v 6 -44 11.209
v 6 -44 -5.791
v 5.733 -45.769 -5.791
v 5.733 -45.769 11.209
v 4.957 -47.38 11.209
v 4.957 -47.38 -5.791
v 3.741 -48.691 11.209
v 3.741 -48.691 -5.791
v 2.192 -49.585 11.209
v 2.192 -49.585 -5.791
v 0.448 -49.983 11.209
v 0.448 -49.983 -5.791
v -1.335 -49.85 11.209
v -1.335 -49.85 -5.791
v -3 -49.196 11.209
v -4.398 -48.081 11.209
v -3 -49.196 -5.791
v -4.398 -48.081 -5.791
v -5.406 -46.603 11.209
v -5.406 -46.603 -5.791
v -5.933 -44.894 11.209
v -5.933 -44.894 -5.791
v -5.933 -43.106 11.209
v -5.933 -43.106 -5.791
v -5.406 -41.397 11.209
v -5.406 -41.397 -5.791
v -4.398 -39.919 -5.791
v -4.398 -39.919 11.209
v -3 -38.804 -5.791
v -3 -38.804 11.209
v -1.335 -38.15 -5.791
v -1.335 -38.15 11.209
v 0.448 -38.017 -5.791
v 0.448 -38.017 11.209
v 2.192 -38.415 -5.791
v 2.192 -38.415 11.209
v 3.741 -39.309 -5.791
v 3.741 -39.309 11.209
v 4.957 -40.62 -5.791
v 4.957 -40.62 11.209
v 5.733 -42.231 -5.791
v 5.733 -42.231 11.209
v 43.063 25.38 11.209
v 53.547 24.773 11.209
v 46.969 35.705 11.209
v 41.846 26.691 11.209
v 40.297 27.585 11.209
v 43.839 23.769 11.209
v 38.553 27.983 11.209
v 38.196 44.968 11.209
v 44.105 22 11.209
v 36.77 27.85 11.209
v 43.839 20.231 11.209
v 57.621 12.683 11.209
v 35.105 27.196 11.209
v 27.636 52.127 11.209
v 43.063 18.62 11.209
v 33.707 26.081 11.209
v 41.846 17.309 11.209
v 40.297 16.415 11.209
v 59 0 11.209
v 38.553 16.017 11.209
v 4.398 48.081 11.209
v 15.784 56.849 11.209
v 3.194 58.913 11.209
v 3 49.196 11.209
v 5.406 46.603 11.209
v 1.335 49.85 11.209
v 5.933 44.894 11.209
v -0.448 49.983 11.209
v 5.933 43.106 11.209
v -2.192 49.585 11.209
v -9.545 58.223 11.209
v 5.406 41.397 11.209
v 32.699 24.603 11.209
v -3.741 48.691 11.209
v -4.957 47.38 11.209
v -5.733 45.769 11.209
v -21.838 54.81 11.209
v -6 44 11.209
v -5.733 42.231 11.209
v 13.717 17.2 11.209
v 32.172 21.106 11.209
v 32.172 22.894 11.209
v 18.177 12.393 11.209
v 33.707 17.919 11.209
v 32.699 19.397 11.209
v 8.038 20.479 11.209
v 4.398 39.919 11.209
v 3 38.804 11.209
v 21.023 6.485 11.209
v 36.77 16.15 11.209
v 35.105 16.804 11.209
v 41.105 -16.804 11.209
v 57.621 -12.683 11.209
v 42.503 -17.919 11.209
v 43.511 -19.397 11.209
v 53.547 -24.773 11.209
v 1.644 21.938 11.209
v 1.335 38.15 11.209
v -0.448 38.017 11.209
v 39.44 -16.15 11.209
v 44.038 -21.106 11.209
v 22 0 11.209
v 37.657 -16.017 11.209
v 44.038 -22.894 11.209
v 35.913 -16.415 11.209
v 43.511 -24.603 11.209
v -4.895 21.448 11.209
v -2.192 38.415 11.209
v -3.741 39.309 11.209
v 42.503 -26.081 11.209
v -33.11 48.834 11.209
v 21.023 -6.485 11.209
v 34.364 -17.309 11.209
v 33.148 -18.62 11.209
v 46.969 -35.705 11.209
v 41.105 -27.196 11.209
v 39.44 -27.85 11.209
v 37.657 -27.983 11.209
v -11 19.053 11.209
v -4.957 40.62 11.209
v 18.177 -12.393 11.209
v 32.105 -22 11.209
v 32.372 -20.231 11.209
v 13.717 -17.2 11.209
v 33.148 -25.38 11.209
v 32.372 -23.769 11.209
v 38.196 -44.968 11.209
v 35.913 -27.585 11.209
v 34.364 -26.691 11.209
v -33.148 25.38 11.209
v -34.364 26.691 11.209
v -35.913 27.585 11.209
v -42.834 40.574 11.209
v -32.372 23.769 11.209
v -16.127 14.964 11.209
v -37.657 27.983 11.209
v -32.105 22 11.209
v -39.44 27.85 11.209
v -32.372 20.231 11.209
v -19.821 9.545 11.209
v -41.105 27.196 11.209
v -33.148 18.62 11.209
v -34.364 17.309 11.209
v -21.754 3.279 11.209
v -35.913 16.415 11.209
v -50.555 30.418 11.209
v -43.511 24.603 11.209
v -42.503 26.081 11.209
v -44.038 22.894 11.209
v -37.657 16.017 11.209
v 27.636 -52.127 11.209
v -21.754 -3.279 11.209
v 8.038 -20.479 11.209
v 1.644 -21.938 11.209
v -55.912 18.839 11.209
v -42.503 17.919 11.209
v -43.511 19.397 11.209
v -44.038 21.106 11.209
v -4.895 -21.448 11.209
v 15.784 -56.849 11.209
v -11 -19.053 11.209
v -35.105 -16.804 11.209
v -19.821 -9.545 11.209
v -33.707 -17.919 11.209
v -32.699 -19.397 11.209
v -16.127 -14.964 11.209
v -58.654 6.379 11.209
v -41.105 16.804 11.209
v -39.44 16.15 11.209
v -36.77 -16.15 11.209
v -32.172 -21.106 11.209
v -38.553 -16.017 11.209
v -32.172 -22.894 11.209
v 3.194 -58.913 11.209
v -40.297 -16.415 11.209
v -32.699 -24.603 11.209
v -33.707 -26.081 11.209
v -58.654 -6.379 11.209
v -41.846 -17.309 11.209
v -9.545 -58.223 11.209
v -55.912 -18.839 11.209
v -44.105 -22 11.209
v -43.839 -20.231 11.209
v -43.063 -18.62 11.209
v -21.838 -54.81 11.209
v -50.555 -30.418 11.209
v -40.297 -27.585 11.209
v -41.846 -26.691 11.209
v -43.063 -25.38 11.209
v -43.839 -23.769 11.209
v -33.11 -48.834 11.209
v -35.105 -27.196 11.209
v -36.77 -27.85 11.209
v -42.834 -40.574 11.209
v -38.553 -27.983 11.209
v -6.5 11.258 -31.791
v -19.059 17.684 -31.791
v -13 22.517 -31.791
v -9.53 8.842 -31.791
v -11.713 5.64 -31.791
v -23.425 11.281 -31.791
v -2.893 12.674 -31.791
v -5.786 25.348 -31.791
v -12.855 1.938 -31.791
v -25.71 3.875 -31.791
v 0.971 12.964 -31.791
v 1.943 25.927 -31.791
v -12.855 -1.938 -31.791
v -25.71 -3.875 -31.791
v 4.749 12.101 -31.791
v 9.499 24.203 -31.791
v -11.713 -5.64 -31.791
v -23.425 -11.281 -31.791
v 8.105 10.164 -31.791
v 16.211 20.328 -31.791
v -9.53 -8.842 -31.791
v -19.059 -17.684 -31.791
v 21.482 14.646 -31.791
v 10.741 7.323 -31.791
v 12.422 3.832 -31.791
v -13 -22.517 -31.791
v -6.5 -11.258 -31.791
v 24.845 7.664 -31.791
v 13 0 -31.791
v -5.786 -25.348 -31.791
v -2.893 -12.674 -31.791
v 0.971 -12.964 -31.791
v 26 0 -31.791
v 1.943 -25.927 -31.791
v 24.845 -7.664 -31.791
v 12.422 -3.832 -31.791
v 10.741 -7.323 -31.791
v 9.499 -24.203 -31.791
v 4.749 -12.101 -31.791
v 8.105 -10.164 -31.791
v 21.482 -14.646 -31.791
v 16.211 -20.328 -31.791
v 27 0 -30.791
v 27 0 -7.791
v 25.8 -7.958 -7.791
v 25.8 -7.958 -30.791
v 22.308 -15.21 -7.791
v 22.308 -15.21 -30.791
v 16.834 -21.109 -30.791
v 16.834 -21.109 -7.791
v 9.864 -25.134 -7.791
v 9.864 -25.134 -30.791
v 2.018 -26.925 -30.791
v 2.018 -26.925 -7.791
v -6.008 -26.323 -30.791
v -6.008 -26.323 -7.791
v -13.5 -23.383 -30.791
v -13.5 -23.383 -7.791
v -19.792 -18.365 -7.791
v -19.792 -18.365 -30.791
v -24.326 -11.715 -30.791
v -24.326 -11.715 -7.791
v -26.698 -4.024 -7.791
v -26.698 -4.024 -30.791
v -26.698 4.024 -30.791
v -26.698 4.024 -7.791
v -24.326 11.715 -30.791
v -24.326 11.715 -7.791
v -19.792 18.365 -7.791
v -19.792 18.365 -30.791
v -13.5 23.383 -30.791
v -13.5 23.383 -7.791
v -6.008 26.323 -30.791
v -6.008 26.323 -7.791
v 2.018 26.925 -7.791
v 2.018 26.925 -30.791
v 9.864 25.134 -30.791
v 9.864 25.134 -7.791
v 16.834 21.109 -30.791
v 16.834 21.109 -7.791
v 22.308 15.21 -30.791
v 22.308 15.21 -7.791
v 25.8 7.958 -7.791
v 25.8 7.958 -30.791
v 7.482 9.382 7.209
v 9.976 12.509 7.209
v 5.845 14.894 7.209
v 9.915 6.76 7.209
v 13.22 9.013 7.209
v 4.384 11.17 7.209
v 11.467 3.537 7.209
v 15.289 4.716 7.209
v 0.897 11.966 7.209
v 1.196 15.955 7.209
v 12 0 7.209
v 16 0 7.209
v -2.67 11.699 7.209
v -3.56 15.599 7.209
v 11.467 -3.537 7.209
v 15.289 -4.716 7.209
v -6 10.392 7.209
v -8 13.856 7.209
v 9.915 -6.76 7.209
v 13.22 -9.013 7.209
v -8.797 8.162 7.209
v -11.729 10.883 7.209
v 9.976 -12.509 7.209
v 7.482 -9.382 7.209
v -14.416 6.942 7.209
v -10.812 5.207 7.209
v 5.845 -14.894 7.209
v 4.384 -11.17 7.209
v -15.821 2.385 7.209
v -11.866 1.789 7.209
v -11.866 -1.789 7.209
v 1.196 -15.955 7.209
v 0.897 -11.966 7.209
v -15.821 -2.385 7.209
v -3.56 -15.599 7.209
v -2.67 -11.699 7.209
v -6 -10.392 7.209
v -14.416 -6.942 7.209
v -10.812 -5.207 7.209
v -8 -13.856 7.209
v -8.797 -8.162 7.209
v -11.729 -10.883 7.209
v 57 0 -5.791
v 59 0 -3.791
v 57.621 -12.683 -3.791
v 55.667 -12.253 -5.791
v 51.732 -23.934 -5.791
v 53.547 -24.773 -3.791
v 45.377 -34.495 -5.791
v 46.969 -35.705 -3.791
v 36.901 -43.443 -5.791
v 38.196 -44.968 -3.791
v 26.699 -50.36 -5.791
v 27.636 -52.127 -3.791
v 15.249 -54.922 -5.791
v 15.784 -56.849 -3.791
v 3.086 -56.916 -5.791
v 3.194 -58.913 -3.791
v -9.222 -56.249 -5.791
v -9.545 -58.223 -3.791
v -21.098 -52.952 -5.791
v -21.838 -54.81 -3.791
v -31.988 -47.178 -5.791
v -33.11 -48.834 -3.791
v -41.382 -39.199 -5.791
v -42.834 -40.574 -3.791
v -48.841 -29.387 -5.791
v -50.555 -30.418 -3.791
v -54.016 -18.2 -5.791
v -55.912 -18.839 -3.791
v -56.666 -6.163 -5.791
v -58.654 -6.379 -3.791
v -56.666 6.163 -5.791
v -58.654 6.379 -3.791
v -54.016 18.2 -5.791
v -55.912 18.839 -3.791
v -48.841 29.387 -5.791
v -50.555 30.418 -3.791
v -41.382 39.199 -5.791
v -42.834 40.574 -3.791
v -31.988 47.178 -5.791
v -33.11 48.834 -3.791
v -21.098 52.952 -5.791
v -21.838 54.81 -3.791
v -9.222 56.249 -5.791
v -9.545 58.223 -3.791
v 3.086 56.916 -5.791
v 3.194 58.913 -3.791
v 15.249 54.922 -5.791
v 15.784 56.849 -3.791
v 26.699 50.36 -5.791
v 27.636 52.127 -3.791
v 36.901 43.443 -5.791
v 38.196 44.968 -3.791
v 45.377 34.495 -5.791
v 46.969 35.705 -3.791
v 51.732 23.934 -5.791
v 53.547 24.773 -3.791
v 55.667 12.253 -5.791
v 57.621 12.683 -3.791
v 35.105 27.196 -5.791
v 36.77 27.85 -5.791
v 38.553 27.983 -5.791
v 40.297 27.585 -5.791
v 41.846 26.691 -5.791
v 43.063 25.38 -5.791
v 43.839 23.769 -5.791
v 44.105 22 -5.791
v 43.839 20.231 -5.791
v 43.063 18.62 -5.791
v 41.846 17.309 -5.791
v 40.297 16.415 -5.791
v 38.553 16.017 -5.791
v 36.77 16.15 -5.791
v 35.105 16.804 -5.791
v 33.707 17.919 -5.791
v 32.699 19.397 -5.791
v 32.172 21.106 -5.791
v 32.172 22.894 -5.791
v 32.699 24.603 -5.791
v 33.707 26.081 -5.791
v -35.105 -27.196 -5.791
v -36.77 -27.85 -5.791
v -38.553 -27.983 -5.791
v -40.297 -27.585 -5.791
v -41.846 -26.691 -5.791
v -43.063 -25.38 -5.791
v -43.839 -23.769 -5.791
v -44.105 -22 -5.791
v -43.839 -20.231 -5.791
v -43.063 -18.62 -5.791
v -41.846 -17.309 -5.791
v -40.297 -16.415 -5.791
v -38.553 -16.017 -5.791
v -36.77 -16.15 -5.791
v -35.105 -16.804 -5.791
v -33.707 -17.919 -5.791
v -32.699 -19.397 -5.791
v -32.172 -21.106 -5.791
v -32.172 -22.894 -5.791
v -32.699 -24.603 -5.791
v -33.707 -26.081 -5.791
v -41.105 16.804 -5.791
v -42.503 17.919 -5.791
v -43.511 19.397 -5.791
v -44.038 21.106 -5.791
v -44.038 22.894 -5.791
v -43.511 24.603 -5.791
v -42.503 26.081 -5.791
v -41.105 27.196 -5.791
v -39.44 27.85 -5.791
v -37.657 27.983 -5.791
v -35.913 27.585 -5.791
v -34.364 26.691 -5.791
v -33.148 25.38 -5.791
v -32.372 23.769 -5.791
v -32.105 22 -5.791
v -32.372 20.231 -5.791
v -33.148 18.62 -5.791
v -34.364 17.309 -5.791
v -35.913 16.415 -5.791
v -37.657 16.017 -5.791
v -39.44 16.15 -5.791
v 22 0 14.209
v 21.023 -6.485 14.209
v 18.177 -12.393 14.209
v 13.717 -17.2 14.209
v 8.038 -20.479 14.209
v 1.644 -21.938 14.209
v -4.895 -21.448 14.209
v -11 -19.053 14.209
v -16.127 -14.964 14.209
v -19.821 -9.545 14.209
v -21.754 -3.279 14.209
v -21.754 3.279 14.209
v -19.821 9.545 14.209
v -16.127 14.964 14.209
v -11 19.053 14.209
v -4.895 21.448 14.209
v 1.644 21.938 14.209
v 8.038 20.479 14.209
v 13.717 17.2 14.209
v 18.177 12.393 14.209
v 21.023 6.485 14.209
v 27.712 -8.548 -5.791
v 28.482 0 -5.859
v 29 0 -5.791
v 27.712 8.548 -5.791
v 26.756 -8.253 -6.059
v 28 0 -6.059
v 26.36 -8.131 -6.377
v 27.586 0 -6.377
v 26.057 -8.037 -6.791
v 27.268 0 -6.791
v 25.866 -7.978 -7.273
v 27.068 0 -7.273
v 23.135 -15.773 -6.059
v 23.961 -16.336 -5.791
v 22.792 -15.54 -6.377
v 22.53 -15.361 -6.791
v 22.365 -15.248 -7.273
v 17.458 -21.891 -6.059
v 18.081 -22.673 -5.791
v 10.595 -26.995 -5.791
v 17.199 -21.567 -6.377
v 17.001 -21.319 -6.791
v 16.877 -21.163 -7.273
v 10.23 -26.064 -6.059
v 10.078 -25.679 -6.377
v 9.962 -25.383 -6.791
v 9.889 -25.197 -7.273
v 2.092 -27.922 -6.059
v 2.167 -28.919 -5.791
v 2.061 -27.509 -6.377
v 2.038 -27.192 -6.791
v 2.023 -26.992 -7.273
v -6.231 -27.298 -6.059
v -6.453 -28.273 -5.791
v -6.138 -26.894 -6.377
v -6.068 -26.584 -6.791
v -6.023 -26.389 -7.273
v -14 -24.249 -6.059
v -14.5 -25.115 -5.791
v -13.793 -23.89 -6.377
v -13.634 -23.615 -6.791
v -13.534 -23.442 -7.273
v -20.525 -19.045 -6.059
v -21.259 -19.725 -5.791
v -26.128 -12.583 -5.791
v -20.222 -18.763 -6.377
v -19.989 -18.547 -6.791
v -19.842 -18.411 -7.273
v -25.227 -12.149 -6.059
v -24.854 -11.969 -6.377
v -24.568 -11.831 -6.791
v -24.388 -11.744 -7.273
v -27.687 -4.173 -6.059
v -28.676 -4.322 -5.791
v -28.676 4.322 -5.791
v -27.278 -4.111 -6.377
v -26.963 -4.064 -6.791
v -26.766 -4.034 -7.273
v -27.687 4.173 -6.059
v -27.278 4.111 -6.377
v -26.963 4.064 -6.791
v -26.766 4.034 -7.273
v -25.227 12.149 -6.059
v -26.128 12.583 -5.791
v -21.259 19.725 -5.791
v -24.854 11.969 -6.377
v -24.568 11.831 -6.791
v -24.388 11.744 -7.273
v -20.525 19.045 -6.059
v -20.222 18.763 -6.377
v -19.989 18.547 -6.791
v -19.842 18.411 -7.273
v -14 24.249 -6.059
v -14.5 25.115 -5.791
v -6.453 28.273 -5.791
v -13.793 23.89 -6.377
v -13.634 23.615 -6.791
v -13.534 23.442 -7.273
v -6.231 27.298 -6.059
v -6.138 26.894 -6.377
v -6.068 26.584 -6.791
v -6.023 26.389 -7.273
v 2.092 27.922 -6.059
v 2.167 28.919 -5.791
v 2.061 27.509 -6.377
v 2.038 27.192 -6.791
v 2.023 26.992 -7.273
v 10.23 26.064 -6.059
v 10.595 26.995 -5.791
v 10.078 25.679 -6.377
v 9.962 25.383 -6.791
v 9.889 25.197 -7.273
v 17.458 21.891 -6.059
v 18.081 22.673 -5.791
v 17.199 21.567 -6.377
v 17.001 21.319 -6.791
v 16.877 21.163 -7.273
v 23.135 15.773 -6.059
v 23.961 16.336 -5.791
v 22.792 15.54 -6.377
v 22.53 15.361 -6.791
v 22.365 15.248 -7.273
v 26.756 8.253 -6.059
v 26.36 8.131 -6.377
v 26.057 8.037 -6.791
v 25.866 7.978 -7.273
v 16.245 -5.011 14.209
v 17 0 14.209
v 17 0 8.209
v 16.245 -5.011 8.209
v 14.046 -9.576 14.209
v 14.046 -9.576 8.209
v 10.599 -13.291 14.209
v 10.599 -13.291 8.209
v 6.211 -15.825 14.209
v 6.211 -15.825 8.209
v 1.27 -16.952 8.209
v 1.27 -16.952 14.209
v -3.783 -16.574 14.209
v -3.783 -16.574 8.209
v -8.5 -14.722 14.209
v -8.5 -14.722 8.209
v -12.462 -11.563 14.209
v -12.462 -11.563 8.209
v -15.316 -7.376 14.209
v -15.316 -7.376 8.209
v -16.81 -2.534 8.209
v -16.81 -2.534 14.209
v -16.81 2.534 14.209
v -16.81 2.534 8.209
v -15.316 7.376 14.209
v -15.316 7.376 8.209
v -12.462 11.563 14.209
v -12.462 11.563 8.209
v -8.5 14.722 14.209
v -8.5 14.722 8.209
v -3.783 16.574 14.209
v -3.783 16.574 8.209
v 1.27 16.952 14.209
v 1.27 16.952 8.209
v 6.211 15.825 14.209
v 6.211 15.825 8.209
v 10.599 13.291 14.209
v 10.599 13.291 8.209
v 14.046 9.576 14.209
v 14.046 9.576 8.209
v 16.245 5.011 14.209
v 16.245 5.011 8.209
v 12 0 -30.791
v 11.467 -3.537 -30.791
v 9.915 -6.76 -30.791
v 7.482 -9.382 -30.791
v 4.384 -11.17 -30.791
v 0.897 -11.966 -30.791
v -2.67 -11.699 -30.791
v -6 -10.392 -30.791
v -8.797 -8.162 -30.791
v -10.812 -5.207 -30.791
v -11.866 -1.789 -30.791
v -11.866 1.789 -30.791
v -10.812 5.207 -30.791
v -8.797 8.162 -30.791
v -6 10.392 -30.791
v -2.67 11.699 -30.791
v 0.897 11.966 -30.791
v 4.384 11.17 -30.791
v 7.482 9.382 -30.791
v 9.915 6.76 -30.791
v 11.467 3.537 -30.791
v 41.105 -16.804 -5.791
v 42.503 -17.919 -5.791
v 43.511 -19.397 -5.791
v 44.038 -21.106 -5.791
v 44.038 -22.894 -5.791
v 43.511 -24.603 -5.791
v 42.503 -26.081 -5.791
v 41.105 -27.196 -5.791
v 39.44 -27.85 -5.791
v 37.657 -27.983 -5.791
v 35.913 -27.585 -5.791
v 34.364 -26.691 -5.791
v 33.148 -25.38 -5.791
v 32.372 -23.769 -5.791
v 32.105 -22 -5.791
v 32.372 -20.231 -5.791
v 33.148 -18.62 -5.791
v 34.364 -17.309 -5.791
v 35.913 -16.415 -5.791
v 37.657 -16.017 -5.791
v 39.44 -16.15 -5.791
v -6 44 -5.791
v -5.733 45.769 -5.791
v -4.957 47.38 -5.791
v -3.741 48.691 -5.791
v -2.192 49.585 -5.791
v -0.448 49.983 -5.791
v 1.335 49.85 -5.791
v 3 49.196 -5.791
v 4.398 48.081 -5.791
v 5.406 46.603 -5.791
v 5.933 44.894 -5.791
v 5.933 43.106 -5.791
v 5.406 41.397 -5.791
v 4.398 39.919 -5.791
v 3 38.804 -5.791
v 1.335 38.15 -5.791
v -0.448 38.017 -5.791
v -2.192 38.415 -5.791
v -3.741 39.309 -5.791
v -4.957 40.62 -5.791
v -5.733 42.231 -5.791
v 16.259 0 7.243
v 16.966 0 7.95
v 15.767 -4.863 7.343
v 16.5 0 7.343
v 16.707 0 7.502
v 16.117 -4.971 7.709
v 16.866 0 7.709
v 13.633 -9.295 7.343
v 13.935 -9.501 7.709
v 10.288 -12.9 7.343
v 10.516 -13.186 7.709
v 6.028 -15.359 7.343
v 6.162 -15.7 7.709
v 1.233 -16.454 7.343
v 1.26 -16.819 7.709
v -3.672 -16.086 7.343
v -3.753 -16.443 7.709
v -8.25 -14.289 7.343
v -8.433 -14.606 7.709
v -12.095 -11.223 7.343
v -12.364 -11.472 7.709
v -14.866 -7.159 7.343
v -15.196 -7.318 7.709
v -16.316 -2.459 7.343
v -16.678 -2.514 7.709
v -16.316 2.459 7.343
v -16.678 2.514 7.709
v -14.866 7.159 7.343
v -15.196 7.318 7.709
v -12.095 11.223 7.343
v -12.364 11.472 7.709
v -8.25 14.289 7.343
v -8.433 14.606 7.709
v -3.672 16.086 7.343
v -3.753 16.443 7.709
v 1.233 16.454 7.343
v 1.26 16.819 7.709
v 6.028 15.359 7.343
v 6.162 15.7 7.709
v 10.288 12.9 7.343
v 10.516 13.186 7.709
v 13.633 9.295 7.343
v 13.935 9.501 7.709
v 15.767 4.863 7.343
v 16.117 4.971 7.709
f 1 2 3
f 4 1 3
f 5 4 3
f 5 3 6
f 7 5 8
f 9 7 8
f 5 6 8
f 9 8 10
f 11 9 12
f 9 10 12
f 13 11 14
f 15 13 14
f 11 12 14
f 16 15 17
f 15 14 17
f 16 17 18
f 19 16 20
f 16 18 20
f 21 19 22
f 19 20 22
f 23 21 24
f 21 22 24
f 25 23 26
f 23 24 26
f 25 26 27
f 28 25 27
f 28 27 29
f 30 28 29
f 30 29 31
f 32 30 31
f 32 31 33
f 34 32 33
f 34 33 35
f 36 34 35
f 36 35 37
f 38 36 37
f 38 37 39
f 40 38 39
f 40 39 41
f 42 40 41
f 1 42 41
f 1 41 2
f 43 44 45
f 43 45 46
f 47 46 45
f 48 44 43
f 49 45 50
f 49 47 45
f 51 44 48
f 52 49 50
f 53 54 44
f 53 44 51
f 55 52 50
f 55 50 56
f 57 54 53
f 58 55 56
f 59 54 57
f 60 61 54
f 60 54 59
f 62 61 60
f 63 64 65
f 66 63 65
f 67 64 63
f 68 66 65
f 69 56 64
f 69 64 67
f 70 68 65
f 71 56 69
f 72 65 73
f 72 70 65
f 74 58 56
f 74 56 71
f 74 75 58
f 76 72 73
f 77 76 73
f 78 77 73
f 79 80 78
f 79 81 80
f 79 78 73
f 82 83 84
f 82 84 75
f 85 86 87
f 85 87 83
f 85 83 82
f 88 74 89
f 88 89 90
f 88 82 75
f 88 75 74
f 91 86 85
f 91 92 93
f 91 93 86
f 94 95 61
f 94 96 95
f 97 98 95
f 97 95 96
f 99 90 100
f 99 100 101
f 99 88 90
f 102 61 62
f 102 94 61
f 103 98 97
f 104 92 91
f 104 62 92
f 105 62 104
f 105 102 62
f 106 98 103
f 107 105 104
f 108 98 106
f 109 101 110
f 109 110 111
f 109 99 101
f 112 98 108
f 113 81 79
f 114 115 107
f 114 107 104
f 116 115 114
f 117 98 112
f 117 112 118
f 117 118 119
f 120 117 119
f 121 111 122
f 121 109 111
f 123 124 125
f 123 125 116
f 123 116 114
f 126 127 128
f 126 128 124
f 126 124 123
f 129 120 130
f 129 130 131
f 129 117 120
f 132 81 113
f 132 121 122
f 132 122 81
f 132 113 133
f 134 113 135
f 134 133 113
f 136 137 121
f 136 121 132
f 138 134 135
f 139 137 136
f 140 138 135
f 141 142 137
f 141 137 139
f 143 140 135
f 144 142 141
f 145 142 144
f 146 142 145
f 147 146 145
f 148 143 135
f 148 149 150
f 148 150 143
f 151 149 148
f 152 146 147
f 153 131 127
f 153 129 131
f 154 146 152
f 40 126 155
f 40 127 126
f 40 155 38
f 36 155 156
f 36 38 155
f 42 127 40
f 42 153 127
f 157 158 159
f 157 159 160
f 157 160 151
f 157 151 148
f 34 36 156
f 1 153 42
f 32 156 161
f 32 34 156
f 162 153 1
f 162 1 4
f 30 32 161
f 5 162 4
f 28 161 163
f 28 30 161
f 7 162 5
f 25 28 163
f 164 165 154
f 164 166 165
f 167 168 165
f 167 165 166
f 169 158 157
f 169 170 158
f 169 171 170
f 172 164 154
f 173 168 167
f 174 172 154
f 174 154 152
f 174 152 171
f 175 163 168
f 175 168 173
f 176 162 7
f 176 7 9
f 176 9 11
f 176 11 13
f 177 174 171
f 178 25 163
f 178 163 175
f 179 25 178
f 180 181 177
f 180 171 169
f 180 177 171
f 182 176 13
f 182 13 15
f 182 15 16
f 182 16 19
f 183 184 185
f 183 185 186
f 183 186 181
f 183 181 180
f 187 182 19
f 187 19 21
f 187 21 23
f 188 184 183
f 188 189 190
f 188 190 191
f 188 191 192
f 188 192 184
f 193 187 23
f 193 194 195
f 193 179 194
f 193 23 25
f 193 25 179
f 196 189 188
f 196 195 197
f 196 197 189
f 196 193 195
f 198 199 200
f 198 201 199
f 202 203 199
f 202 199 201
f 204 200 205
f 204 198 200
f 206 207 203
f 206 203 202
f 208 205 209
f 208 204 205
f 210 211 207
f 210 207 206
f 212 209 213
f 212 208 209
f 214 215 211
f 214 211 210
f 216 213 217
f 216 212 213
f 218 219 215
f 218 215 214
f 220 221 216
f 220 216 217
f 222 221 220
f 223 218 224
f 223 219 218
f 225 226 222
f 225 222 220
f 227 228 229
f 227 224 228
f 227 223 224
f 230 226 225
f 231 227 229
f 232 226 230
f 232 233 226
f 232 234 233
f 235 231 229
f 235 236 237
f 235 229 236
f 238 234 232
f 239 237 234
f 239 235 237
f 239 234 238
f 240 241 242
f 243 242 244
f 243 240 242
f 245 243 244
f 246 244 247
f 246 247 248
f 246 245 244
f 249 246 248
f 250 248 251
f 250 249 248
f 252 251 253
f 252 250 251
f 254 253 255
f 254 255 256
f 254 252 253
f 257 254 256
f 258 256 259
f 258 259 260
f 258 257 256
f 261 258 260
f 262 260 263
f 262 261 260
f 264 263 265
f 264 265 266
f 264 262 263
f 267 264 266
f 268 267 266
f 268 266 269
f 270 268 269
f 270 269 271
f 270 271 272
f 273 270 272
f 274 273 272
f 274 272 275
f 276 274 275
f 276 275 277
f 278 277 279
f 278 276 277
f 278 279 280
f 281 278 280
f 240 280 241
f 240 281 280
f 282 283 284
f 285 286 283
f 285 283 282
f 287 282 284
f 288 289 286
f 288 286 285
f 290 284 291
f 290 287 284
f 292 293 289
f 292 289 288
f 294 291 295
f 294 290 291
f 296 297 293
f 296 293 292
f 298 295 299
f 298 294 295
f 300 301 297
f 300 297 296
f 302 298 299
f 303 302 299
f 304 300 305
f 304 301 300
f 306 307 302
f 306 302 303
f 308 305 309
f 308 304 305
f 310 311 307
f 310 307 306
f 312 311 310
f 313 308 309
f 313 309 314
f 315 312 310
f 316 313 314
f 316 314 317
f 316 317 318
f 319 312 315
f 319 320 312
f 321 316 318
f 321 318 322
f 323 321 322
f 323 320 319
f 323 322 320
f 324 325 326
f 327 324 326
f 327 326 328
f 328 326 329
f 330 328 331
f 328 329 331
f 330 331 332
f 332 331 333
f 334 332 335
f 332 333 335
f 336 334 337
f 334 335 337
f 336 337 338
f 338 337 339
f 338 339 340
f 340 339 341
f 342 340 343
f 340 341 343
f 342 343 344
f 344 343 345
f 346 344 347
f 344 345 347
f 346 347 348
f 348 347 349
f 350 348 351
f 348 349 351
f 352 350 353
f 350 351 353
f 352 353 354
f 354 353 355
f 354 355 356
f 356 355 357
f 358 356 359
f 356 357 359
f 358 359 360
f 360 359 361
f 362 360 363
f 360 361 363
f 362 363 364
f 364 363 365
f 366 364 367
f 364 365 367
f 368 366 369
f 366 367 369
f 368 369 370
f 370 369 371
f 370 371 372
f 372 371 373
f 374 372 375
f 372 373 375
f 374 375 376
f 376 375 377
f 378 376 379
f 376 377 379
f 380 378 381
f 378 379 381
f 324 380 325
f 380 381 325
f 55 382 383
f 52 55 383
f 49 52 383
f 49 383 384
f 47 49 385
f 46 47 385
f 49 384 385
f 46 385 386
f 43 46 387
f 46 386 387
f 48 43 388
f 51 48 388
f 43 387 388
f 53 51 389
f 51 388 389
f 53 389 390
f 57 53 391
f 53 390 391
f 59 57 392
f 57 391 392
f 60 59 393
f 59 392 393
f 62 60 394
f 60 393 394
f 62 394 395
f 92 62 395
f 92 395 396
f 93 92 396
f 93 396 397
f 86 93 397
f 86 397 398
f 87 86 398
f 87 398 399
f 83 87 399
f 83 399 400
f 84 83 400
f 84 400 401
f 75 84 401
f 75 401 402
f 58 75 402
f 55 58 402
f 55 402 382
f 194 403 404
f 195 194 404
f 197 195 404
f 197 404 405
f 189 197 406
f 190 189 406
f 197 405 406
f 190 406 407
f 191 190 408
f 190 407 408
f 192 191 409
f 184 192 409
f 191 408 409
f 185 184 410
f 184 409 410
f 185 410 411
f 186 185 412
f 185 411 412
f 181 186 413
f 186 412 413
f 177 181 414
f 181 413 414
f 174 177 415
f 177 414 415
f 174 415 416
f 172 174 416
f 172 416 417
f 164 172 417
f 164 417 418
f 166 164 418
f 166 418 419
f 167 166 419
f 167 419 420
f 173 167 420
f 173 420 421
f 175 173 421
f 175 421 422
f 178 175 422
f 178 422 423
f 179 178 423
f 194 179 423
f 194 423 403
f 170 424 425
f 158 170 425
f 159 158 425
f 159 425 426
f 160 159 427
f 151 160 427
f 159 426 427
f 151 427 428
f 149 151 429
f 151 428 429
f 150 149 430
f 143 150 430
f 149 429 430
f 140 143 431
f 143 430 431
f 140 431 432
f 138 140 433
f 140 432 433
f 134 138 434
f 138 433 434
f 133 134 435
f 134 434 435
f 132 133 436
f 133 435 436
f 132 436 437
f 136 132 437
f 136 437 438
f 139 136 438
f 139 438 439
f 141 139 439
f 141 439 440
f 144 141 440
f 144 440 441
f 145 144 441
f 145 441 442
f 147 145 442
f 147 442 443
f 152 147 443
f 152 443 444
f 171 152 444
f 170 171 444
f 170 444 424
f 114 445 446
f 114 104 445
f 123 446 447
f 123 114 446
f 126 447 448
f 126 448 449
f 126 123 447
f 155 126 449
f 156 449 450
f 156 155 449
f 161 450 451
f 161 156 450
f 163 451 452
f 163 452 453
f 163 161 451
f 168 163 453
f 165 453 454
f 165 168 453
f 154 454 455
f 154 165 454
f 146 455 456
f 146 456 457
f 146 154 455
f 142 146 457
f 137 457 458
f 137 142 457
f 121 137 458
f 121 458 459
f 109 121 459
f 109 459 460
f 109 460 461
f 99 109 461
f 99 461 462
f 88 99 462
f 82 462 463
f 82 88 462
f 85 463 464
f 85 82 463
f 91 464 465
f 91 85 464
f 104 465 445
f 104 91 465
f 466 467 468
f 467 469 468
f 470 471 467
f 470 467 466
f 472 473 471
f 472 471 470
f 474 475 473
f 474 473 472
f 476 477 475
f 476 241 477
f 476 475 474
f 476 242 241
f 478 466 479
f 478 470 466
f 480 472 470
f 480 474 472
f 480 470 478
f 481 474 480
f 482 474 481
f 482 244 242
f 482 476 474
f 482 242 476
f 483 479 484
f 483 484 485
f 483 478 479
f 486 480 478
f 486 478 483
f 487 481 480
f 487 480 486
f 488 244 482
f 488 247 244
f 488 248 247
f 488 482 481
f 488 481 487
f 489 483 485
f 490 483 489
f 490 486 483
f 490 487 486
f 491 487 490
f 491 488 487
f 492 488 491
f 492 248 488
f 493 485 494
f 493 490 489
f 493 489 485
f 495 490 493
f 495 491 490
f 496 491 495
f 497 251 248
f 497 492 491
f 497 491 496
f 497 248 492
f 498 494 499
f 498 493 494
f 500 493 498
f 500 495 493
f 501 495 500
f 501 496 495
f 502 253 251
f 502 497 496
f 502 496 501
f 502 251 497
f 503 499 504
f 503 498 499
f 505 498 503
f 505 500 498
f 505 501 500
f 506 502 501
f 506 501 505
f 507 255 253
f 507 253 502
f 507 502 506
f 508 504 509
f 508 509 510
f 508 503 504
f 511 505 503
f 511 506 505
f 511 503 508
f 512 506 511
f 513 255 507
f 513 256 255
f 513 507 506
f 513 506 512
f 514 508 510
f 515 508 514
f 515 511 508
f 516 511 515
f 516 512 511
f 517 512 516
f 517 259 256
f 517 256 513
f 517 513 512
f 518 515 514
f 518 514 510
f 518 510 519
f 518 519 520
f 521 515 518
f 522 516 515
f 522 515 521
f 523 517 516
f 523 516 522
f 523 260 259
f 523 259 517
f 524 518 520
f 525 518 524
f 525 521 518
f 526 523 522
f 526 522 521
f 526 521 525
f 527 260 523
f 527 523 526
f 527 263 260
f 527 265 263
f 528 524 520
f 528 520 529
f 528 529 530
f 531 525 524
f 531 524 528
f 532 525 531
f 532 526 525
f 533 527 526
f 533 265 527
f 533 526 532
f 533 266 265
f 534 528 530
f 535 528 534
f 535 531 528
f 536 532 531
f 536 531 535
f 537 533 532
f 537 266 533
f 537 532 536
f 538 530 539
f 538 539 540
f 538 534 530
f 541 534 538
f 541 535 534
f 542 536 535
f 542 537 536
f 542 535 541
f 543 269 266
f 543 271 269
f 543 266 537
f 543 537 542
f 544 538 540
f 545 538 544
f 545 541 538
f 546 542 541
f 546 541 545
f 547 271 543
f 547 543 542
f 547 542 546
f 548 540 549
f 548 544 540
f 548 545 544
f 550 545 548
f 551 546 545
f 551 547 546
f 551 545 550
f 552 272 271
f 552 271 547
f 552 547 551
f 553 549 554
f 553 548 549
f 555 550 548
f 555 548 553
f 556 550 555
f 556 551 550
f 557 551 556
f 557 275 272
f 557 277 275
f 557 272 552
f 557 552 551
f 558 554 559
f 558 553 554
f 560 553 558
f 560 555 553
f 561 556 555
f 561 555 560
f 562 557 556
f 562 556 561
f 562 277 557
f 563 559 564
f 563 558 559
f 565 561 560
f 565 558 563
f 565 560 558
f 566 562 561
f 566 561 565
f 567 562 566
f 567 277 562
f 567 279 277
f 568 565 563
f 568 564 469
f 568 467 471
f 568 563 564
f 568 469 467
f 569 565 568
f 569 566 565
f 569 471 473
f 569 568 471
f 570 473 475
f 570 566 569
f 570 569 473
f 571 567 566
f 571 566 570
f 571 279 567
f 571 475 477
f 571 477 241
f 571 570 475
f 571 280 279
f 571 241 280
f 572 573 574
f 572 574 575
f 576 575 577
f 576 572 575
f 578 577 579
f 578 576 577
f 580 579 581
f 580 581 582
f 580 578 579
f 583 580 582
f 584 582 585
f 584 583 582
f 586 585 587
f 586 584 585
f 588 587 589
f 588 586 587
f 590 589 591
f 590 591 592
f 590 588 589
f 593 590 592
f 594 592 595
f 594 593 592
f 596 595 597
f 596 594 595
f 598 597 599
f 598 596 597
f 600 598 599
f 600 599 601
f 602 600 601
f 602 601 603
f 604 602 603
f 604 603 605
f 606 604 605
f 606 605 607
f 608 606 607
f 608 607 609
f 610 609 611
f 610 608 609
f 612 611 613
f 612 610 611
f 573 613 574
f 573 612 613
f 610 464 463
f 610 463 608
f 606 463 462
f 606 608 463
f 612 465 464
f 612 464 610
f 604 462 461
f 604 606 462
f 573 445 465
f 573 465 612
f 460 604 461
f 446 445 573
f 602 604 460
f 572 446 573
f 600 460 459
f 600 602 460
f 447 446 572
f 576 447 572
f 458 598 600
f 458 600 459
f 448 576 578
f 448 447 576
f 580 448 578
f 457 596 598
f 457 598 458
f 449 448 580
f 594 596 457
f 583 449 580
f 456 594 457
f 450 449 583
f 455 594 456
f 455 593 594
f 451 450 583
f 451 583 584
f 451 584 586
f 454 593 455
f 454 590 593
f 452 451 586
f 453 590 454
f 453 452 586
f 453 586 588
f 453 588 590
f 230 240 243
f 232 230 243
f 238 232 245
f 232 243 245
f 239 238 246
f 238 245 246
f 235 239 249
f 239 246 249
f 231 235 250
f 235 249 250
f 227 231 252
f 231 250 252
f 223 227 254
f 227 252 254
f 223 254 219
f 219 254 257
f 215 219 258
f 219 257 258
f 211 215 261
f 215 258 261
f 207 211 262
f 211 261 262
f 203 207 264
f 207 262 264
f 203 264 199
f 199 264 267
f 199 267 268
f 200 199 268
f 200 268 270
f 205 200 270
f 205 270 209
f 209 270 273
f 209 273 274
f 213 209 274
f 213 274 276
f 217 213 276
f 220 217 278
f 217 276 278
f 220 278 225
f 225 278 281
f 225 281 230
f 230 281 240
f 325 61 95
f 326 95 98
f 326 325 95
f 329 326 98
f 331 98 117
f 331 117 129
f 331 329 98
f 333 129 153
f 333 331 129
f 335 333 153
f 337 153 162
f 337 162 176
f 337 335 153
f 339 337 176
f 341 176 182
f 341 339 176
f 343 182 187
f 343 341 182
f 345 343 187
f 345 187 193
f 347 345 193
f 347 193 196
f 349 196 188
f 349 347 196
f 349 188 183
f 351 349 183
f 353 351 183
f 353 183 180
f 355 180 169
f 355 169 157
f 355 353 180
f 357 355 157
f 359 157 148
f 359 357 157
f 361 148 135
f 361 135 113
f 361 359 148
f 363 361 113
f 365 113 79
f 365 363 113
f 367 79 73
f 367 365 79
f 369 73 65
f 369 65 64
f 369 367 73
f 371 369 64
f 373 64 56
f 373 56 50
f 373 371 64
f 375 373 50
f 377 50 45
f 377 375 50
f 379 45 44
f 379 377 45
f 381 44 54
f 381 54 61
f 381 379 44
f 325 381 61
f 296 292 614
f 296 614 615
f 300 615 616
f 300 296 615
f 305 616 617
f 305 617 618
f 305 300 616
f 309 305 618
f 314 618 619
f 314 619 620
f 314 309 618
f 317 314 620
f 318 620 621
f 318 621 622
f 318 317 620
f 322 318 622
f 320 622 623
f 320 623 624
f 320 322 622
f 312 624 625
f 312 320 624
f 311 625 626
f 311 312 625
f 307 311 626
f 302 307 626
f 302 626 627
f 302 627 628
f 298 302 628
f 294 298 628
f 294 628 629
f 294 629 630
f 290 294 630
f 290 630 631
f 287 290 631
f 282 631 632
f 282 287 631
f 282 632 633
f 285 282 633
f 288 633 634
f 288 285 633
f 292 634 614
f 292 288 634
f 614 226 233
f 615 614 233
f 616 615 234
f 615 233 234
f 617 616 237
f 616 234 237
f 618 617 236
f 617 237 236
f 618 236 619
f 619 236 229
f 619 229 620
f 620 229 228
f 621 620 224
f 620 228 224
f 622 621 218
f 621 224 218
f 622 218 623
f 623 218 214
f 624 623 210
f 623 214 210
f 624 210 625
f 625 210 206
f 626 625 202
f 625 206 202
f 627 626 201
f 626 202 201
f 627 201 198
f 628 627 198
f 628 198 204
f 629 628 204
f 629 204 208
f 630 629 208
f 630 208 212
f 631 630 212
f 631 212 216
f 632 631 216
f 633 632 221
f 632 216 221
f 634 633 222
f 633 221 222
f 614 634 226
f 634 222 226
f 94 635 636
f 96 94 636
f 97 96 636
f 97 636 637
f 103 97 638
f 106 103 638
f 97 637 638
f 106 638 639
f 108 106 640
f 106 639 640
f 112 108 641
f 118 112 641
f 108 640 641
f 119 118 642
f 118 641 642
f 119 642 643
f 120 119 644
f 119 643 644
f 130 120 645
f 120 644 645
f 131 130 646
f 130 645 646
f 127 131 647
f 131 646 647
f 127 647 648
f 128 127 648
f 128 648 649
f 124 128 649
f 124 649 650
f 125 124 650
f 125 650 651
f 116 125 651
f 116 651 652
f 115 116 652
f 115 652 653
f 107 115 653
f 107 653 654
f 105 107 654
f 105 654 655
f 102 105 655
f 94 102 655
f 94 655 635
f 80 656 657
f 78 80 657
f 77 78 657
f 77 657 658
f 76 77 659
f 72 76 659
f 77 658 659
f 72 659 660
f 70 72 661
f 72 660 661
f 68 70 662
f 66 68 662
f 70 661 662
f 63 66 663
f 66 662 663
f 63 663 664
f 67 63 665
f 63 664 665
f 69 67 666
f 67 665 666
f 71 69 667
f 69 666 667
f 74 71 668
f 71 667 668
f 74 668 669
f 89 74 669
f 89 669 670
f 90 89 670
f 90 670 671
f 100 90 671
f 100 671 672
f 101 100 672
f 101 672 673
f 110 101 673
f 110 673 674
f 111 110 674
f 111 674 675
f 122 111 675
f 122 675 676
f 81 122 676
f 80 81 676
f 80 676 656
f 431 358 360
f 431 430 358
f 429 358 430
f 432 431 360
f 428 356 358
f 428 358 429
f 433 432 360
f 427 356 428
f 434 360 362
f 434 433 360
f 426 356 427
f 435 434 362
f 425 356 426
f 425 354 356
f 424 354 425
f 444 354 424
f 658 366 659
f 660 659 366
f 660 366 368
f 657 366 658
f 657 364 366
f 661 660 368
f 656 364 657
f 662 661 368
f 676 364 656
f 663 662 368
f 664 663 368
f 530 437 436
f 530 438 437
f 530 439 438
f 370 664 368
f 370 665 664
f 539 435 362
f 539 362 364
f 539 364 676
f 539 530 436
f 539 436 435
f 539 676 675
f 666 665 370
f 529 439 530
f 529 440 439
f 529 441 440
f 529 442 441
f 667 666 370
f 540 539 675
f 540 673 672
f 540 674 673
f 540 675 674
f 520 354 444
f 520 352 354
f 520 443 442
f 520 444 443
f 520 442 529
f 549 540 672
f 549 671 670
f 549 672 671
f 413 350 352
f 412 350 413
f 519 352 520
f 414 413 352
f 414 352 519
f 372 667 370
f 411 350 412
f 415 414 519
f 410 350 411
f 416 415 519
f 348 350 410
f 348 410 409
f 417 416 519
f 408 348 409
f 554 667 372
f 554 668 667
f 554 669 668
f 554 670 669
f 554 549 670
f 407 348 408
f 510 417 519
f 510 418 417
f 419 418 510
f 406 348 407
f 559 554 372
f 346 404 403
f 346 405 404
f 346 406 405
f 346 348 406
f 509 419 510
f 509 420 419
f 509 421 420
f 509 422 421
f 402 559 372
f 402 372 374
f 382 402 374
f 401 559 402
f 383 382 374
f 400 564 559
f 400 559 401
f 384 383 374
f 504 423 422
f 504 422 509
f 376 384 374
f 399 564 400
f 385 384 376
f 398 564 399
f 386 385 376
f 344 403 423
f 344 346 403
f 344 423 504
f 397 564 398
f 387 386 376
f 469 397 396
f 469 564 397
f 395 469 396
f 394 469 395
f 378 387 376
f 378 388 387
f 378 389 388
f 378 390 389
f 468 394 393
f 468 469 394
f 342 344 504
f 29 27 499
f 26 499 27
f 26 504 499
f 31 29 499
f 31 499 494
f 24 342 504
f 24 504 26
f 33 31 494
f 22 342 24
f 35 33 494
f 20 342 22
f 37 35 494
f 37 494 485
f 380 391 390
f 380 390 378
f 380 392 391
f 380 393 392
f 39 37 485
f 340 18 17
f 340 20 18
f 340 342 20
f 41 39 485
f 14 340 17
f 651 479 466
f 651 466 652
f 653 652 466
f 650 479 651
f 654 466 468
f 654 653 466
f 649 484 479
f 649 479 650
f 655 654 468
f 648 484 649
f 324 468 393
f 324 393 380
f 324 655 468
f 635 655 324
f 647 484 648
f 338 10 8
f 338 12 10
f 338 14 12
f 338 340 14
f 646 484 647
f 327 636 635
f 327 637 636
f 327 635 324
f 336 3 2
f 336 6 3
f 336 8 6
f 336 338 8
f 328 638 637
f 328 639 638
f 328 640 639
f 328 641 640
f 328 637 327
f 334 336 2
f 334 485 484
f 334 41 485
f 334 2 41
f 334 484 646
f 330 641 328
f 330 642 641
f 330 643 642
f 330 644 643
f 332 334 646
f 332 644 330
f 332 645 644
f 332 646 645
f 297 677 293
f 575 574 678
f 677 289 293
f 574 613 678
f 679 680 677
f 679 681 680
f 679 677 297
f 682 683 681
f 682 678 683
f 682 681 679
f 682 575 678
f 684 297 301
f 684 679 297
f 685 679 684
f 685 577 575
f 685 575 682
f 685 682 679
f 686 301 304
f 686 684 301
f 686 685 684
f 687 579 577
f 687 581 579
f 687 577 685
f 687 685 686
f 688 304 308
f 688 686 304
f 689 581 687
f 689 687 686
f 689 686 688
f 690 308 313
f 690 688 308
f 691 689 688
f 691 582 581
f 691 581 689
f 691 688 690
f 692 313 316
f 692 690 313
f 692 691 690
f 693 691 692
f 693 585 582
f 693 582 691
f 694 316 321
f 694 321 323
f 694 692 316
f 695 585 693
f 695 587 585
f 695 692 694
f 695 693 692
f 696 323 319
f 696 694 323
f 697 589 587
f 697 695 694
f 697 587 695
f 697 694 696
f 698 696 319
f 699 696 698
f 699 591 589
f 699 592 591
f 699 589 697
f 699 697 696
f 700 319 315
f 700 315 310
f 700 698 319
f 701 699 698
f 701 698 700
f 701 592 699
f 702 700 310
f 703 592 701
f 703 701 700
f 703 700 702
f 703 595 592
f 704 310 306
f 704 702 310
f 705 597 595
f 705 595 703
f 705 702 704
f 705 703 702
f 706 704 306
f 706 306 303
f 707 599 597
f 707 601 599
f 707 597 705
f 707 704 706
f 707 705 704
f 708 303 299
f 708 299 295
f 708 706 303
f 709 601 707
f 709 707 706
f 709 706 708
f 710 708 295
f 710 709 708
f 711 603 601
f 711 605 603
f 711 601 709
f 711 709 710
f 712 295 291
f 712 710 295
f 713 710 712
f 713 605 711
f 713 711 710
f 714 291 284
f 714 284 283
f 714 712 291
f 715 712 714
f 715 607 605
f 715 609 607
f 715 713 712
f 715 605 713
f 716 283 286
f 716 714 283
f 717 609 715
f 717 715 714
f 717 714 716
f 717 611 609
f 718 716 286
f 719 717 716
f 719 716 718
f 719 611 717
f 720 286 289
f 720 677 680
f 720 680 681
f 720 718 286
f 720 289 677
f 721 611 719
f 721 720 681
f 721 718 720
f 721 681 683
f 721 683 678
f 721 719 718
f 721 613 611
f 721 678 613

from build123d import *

# Parameters (mm, degrees)
CUT_EXTRUDE1_REACH = 89.396
SKETCH2_R          = 6
CIRPATTERN1_COUNT  = 6
FILLET1_R          = 2
FILLET2_R          = 1
CHAMFER1_SIZE      = 1
CHAMFER2_SIZE      = 2


with BuildPart() as part:
    # Sketch1 → Revolve1 (revolve)
    with BuildSketch(Plane(origin=(0, 0, 0), x_dir=(0, 0, -1), z_dir=(1, 0, 0)), mode=Mode.PRIVATE) as revolve1_sk:
        Polygon((-11.208917924, 22), (-11.208917924, 59), (5.791082076, 59), (5.791082076, 27), (31.791082076, 27), (31.791082076, 12), (-7.208917924, 12), (-7.208917924, 17), (-14.208917924, 17), (-14.208917924, 22), align=None)
    revolve(revolve1_sk.sketch.rotate(Axis((0, 0, 9.001223373), (0, 0, -1)), 90), axis=Axis((0, 0, 9.001223373), (0, 0, -1)))

    # Sketch2 → Cut-Extrude1 (cut, up to next)
    with BuildSketch(Plane(origin=(0, 0, -5.791082076), x_dir=(-1, 0, 0), z_dir=(0, 0, -1)), mode=Mode.PRIVATE) as cut_extrude1_sk1:
        with Locations((0, 44)):
            Circle(SKETCH2_R)
    cut_extrude1_tool1 = extrude(cut_extrude1_sk1.sketch, amount=-CUT_EXTRUDE1_REACH, mode=Mode.PRIVATE) & part.part
    cut_extrude1 = cut_extrude1_tool1.solids().sort_by_distance((0, 44, -5.791082))[0]
    add(cut_extrude1, mode=Mode.SUBTRACT)

    # CirPattern1: Cut-Extrude1 ×6 about axis
    cirpattern1_axis = Axis((0, 0, 0), (0, 0, 1))
    for i in range(1, CIRPATTERN1_COUNT):
        add(cut_extrude1.rotate(cirpattern1_axis, i * 360 / CIRPATTERN1_COUNT), mode=Mode.SUBTRACT)

    # Fillet1
    fillet1_edges = [part.edges().sort_by_distance(p)[0] for p in [
        (-27, 0, -5.791082076),
    ]]
    fillet(fillet1_edges, radius=FILLET1_R)

    # Fillet2
    fillet2_edges = [part.edges().sort_by_distance(p)[0] for p in [
        (-17, 0, 7.208917924),
    ]]
    fillet(fillet2_edges, radius=FILLET2_R)

    # Chamfer1
    chamfer1_edges = [part.edges().sort_by_distance(p)[0] for p in [
        (-12, 0, -31.791082076),
        (-27, 0, -31.791082076),
    ]]
    chamfer(chamfer1_edges, length=CHAMFER1_SIZE)

    # Chamfer2
    chamfer2_edges = [part.edges().sort_by_distance(p)[0] for p in [
        (-59, 0, -5.791082076),
    ]]
    chamfer(chamfer2_edges, length=CHAMFER2_SIZE)


solid = part.part
